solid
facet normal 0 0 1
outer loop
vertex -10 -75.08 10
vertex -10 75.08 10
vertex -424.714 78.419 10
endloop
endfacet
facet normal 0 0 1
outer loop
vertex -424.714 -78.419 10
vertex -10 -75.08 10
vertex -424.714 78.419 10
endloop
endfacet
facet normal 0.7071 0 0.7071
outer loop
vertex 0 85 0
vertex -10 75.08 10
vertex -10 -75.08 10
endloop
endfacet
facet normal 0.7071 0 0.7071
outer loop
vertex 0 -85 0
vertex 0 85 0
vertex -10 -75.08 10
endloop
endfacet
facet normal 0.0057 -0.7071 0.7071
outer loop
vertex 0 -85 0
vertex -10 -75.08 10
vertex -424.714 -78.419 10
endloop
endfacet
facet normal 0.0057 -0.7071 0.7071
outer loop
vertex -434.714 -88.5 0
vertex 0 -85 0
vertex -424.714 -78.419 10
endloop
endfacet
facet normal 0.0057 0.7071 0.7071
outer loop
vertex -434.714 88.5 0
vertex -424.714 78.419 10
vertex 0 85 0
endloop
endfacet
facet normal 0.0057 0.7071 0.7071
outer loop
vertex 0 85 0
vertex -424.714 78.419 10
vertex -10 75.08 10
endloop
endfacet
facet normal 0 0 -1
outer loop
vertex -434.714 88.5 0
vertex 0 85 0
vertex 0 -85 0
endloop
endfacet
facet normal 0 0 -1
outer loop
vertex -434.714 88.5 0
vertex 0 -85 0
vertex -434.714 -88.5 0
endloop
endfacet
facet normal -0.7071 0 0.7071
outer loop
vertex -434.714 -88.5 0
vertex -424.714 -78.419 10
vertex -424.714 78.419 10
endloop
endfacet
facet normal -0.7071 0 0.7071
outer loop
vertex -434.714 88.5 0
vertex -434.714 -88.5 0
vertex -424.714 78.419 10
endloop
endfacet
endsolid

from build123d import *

# Parameters (mm, degrees)
AUFSATZ_LINEAR_AUSTRAGEN1_DEPTH = 10
FASE1_SIZE                      = 10


with BuildPart() as part:
    # Skizze1 → Aufsatz-Linear austragen1 (new body)
    with BuildSketch(Plane.XY):
        Polygon((-434.714346895, -88.5), (-434.714346895, 88.5), (0, 85), (0, -85), align=None)
    extrude(amount=AUFSATZ_LINEAR_AUSTRAGEN1_DEPTH)

    # Fase1
    fase1_edges = [part.edges().sort_by_distance(p)[0] for p in [
        (-434.714346895, 0, 10),
        (-217.357173448, 86.75, 10),
        (0, 0, 10),
        (-217.357173448, -86.75, 10),
    ]]
    chamfer(fase1_edges, length=FASE1_SIZE - 0.0001)  # a hair under: the kernel refuses the full size


solid = part.part
